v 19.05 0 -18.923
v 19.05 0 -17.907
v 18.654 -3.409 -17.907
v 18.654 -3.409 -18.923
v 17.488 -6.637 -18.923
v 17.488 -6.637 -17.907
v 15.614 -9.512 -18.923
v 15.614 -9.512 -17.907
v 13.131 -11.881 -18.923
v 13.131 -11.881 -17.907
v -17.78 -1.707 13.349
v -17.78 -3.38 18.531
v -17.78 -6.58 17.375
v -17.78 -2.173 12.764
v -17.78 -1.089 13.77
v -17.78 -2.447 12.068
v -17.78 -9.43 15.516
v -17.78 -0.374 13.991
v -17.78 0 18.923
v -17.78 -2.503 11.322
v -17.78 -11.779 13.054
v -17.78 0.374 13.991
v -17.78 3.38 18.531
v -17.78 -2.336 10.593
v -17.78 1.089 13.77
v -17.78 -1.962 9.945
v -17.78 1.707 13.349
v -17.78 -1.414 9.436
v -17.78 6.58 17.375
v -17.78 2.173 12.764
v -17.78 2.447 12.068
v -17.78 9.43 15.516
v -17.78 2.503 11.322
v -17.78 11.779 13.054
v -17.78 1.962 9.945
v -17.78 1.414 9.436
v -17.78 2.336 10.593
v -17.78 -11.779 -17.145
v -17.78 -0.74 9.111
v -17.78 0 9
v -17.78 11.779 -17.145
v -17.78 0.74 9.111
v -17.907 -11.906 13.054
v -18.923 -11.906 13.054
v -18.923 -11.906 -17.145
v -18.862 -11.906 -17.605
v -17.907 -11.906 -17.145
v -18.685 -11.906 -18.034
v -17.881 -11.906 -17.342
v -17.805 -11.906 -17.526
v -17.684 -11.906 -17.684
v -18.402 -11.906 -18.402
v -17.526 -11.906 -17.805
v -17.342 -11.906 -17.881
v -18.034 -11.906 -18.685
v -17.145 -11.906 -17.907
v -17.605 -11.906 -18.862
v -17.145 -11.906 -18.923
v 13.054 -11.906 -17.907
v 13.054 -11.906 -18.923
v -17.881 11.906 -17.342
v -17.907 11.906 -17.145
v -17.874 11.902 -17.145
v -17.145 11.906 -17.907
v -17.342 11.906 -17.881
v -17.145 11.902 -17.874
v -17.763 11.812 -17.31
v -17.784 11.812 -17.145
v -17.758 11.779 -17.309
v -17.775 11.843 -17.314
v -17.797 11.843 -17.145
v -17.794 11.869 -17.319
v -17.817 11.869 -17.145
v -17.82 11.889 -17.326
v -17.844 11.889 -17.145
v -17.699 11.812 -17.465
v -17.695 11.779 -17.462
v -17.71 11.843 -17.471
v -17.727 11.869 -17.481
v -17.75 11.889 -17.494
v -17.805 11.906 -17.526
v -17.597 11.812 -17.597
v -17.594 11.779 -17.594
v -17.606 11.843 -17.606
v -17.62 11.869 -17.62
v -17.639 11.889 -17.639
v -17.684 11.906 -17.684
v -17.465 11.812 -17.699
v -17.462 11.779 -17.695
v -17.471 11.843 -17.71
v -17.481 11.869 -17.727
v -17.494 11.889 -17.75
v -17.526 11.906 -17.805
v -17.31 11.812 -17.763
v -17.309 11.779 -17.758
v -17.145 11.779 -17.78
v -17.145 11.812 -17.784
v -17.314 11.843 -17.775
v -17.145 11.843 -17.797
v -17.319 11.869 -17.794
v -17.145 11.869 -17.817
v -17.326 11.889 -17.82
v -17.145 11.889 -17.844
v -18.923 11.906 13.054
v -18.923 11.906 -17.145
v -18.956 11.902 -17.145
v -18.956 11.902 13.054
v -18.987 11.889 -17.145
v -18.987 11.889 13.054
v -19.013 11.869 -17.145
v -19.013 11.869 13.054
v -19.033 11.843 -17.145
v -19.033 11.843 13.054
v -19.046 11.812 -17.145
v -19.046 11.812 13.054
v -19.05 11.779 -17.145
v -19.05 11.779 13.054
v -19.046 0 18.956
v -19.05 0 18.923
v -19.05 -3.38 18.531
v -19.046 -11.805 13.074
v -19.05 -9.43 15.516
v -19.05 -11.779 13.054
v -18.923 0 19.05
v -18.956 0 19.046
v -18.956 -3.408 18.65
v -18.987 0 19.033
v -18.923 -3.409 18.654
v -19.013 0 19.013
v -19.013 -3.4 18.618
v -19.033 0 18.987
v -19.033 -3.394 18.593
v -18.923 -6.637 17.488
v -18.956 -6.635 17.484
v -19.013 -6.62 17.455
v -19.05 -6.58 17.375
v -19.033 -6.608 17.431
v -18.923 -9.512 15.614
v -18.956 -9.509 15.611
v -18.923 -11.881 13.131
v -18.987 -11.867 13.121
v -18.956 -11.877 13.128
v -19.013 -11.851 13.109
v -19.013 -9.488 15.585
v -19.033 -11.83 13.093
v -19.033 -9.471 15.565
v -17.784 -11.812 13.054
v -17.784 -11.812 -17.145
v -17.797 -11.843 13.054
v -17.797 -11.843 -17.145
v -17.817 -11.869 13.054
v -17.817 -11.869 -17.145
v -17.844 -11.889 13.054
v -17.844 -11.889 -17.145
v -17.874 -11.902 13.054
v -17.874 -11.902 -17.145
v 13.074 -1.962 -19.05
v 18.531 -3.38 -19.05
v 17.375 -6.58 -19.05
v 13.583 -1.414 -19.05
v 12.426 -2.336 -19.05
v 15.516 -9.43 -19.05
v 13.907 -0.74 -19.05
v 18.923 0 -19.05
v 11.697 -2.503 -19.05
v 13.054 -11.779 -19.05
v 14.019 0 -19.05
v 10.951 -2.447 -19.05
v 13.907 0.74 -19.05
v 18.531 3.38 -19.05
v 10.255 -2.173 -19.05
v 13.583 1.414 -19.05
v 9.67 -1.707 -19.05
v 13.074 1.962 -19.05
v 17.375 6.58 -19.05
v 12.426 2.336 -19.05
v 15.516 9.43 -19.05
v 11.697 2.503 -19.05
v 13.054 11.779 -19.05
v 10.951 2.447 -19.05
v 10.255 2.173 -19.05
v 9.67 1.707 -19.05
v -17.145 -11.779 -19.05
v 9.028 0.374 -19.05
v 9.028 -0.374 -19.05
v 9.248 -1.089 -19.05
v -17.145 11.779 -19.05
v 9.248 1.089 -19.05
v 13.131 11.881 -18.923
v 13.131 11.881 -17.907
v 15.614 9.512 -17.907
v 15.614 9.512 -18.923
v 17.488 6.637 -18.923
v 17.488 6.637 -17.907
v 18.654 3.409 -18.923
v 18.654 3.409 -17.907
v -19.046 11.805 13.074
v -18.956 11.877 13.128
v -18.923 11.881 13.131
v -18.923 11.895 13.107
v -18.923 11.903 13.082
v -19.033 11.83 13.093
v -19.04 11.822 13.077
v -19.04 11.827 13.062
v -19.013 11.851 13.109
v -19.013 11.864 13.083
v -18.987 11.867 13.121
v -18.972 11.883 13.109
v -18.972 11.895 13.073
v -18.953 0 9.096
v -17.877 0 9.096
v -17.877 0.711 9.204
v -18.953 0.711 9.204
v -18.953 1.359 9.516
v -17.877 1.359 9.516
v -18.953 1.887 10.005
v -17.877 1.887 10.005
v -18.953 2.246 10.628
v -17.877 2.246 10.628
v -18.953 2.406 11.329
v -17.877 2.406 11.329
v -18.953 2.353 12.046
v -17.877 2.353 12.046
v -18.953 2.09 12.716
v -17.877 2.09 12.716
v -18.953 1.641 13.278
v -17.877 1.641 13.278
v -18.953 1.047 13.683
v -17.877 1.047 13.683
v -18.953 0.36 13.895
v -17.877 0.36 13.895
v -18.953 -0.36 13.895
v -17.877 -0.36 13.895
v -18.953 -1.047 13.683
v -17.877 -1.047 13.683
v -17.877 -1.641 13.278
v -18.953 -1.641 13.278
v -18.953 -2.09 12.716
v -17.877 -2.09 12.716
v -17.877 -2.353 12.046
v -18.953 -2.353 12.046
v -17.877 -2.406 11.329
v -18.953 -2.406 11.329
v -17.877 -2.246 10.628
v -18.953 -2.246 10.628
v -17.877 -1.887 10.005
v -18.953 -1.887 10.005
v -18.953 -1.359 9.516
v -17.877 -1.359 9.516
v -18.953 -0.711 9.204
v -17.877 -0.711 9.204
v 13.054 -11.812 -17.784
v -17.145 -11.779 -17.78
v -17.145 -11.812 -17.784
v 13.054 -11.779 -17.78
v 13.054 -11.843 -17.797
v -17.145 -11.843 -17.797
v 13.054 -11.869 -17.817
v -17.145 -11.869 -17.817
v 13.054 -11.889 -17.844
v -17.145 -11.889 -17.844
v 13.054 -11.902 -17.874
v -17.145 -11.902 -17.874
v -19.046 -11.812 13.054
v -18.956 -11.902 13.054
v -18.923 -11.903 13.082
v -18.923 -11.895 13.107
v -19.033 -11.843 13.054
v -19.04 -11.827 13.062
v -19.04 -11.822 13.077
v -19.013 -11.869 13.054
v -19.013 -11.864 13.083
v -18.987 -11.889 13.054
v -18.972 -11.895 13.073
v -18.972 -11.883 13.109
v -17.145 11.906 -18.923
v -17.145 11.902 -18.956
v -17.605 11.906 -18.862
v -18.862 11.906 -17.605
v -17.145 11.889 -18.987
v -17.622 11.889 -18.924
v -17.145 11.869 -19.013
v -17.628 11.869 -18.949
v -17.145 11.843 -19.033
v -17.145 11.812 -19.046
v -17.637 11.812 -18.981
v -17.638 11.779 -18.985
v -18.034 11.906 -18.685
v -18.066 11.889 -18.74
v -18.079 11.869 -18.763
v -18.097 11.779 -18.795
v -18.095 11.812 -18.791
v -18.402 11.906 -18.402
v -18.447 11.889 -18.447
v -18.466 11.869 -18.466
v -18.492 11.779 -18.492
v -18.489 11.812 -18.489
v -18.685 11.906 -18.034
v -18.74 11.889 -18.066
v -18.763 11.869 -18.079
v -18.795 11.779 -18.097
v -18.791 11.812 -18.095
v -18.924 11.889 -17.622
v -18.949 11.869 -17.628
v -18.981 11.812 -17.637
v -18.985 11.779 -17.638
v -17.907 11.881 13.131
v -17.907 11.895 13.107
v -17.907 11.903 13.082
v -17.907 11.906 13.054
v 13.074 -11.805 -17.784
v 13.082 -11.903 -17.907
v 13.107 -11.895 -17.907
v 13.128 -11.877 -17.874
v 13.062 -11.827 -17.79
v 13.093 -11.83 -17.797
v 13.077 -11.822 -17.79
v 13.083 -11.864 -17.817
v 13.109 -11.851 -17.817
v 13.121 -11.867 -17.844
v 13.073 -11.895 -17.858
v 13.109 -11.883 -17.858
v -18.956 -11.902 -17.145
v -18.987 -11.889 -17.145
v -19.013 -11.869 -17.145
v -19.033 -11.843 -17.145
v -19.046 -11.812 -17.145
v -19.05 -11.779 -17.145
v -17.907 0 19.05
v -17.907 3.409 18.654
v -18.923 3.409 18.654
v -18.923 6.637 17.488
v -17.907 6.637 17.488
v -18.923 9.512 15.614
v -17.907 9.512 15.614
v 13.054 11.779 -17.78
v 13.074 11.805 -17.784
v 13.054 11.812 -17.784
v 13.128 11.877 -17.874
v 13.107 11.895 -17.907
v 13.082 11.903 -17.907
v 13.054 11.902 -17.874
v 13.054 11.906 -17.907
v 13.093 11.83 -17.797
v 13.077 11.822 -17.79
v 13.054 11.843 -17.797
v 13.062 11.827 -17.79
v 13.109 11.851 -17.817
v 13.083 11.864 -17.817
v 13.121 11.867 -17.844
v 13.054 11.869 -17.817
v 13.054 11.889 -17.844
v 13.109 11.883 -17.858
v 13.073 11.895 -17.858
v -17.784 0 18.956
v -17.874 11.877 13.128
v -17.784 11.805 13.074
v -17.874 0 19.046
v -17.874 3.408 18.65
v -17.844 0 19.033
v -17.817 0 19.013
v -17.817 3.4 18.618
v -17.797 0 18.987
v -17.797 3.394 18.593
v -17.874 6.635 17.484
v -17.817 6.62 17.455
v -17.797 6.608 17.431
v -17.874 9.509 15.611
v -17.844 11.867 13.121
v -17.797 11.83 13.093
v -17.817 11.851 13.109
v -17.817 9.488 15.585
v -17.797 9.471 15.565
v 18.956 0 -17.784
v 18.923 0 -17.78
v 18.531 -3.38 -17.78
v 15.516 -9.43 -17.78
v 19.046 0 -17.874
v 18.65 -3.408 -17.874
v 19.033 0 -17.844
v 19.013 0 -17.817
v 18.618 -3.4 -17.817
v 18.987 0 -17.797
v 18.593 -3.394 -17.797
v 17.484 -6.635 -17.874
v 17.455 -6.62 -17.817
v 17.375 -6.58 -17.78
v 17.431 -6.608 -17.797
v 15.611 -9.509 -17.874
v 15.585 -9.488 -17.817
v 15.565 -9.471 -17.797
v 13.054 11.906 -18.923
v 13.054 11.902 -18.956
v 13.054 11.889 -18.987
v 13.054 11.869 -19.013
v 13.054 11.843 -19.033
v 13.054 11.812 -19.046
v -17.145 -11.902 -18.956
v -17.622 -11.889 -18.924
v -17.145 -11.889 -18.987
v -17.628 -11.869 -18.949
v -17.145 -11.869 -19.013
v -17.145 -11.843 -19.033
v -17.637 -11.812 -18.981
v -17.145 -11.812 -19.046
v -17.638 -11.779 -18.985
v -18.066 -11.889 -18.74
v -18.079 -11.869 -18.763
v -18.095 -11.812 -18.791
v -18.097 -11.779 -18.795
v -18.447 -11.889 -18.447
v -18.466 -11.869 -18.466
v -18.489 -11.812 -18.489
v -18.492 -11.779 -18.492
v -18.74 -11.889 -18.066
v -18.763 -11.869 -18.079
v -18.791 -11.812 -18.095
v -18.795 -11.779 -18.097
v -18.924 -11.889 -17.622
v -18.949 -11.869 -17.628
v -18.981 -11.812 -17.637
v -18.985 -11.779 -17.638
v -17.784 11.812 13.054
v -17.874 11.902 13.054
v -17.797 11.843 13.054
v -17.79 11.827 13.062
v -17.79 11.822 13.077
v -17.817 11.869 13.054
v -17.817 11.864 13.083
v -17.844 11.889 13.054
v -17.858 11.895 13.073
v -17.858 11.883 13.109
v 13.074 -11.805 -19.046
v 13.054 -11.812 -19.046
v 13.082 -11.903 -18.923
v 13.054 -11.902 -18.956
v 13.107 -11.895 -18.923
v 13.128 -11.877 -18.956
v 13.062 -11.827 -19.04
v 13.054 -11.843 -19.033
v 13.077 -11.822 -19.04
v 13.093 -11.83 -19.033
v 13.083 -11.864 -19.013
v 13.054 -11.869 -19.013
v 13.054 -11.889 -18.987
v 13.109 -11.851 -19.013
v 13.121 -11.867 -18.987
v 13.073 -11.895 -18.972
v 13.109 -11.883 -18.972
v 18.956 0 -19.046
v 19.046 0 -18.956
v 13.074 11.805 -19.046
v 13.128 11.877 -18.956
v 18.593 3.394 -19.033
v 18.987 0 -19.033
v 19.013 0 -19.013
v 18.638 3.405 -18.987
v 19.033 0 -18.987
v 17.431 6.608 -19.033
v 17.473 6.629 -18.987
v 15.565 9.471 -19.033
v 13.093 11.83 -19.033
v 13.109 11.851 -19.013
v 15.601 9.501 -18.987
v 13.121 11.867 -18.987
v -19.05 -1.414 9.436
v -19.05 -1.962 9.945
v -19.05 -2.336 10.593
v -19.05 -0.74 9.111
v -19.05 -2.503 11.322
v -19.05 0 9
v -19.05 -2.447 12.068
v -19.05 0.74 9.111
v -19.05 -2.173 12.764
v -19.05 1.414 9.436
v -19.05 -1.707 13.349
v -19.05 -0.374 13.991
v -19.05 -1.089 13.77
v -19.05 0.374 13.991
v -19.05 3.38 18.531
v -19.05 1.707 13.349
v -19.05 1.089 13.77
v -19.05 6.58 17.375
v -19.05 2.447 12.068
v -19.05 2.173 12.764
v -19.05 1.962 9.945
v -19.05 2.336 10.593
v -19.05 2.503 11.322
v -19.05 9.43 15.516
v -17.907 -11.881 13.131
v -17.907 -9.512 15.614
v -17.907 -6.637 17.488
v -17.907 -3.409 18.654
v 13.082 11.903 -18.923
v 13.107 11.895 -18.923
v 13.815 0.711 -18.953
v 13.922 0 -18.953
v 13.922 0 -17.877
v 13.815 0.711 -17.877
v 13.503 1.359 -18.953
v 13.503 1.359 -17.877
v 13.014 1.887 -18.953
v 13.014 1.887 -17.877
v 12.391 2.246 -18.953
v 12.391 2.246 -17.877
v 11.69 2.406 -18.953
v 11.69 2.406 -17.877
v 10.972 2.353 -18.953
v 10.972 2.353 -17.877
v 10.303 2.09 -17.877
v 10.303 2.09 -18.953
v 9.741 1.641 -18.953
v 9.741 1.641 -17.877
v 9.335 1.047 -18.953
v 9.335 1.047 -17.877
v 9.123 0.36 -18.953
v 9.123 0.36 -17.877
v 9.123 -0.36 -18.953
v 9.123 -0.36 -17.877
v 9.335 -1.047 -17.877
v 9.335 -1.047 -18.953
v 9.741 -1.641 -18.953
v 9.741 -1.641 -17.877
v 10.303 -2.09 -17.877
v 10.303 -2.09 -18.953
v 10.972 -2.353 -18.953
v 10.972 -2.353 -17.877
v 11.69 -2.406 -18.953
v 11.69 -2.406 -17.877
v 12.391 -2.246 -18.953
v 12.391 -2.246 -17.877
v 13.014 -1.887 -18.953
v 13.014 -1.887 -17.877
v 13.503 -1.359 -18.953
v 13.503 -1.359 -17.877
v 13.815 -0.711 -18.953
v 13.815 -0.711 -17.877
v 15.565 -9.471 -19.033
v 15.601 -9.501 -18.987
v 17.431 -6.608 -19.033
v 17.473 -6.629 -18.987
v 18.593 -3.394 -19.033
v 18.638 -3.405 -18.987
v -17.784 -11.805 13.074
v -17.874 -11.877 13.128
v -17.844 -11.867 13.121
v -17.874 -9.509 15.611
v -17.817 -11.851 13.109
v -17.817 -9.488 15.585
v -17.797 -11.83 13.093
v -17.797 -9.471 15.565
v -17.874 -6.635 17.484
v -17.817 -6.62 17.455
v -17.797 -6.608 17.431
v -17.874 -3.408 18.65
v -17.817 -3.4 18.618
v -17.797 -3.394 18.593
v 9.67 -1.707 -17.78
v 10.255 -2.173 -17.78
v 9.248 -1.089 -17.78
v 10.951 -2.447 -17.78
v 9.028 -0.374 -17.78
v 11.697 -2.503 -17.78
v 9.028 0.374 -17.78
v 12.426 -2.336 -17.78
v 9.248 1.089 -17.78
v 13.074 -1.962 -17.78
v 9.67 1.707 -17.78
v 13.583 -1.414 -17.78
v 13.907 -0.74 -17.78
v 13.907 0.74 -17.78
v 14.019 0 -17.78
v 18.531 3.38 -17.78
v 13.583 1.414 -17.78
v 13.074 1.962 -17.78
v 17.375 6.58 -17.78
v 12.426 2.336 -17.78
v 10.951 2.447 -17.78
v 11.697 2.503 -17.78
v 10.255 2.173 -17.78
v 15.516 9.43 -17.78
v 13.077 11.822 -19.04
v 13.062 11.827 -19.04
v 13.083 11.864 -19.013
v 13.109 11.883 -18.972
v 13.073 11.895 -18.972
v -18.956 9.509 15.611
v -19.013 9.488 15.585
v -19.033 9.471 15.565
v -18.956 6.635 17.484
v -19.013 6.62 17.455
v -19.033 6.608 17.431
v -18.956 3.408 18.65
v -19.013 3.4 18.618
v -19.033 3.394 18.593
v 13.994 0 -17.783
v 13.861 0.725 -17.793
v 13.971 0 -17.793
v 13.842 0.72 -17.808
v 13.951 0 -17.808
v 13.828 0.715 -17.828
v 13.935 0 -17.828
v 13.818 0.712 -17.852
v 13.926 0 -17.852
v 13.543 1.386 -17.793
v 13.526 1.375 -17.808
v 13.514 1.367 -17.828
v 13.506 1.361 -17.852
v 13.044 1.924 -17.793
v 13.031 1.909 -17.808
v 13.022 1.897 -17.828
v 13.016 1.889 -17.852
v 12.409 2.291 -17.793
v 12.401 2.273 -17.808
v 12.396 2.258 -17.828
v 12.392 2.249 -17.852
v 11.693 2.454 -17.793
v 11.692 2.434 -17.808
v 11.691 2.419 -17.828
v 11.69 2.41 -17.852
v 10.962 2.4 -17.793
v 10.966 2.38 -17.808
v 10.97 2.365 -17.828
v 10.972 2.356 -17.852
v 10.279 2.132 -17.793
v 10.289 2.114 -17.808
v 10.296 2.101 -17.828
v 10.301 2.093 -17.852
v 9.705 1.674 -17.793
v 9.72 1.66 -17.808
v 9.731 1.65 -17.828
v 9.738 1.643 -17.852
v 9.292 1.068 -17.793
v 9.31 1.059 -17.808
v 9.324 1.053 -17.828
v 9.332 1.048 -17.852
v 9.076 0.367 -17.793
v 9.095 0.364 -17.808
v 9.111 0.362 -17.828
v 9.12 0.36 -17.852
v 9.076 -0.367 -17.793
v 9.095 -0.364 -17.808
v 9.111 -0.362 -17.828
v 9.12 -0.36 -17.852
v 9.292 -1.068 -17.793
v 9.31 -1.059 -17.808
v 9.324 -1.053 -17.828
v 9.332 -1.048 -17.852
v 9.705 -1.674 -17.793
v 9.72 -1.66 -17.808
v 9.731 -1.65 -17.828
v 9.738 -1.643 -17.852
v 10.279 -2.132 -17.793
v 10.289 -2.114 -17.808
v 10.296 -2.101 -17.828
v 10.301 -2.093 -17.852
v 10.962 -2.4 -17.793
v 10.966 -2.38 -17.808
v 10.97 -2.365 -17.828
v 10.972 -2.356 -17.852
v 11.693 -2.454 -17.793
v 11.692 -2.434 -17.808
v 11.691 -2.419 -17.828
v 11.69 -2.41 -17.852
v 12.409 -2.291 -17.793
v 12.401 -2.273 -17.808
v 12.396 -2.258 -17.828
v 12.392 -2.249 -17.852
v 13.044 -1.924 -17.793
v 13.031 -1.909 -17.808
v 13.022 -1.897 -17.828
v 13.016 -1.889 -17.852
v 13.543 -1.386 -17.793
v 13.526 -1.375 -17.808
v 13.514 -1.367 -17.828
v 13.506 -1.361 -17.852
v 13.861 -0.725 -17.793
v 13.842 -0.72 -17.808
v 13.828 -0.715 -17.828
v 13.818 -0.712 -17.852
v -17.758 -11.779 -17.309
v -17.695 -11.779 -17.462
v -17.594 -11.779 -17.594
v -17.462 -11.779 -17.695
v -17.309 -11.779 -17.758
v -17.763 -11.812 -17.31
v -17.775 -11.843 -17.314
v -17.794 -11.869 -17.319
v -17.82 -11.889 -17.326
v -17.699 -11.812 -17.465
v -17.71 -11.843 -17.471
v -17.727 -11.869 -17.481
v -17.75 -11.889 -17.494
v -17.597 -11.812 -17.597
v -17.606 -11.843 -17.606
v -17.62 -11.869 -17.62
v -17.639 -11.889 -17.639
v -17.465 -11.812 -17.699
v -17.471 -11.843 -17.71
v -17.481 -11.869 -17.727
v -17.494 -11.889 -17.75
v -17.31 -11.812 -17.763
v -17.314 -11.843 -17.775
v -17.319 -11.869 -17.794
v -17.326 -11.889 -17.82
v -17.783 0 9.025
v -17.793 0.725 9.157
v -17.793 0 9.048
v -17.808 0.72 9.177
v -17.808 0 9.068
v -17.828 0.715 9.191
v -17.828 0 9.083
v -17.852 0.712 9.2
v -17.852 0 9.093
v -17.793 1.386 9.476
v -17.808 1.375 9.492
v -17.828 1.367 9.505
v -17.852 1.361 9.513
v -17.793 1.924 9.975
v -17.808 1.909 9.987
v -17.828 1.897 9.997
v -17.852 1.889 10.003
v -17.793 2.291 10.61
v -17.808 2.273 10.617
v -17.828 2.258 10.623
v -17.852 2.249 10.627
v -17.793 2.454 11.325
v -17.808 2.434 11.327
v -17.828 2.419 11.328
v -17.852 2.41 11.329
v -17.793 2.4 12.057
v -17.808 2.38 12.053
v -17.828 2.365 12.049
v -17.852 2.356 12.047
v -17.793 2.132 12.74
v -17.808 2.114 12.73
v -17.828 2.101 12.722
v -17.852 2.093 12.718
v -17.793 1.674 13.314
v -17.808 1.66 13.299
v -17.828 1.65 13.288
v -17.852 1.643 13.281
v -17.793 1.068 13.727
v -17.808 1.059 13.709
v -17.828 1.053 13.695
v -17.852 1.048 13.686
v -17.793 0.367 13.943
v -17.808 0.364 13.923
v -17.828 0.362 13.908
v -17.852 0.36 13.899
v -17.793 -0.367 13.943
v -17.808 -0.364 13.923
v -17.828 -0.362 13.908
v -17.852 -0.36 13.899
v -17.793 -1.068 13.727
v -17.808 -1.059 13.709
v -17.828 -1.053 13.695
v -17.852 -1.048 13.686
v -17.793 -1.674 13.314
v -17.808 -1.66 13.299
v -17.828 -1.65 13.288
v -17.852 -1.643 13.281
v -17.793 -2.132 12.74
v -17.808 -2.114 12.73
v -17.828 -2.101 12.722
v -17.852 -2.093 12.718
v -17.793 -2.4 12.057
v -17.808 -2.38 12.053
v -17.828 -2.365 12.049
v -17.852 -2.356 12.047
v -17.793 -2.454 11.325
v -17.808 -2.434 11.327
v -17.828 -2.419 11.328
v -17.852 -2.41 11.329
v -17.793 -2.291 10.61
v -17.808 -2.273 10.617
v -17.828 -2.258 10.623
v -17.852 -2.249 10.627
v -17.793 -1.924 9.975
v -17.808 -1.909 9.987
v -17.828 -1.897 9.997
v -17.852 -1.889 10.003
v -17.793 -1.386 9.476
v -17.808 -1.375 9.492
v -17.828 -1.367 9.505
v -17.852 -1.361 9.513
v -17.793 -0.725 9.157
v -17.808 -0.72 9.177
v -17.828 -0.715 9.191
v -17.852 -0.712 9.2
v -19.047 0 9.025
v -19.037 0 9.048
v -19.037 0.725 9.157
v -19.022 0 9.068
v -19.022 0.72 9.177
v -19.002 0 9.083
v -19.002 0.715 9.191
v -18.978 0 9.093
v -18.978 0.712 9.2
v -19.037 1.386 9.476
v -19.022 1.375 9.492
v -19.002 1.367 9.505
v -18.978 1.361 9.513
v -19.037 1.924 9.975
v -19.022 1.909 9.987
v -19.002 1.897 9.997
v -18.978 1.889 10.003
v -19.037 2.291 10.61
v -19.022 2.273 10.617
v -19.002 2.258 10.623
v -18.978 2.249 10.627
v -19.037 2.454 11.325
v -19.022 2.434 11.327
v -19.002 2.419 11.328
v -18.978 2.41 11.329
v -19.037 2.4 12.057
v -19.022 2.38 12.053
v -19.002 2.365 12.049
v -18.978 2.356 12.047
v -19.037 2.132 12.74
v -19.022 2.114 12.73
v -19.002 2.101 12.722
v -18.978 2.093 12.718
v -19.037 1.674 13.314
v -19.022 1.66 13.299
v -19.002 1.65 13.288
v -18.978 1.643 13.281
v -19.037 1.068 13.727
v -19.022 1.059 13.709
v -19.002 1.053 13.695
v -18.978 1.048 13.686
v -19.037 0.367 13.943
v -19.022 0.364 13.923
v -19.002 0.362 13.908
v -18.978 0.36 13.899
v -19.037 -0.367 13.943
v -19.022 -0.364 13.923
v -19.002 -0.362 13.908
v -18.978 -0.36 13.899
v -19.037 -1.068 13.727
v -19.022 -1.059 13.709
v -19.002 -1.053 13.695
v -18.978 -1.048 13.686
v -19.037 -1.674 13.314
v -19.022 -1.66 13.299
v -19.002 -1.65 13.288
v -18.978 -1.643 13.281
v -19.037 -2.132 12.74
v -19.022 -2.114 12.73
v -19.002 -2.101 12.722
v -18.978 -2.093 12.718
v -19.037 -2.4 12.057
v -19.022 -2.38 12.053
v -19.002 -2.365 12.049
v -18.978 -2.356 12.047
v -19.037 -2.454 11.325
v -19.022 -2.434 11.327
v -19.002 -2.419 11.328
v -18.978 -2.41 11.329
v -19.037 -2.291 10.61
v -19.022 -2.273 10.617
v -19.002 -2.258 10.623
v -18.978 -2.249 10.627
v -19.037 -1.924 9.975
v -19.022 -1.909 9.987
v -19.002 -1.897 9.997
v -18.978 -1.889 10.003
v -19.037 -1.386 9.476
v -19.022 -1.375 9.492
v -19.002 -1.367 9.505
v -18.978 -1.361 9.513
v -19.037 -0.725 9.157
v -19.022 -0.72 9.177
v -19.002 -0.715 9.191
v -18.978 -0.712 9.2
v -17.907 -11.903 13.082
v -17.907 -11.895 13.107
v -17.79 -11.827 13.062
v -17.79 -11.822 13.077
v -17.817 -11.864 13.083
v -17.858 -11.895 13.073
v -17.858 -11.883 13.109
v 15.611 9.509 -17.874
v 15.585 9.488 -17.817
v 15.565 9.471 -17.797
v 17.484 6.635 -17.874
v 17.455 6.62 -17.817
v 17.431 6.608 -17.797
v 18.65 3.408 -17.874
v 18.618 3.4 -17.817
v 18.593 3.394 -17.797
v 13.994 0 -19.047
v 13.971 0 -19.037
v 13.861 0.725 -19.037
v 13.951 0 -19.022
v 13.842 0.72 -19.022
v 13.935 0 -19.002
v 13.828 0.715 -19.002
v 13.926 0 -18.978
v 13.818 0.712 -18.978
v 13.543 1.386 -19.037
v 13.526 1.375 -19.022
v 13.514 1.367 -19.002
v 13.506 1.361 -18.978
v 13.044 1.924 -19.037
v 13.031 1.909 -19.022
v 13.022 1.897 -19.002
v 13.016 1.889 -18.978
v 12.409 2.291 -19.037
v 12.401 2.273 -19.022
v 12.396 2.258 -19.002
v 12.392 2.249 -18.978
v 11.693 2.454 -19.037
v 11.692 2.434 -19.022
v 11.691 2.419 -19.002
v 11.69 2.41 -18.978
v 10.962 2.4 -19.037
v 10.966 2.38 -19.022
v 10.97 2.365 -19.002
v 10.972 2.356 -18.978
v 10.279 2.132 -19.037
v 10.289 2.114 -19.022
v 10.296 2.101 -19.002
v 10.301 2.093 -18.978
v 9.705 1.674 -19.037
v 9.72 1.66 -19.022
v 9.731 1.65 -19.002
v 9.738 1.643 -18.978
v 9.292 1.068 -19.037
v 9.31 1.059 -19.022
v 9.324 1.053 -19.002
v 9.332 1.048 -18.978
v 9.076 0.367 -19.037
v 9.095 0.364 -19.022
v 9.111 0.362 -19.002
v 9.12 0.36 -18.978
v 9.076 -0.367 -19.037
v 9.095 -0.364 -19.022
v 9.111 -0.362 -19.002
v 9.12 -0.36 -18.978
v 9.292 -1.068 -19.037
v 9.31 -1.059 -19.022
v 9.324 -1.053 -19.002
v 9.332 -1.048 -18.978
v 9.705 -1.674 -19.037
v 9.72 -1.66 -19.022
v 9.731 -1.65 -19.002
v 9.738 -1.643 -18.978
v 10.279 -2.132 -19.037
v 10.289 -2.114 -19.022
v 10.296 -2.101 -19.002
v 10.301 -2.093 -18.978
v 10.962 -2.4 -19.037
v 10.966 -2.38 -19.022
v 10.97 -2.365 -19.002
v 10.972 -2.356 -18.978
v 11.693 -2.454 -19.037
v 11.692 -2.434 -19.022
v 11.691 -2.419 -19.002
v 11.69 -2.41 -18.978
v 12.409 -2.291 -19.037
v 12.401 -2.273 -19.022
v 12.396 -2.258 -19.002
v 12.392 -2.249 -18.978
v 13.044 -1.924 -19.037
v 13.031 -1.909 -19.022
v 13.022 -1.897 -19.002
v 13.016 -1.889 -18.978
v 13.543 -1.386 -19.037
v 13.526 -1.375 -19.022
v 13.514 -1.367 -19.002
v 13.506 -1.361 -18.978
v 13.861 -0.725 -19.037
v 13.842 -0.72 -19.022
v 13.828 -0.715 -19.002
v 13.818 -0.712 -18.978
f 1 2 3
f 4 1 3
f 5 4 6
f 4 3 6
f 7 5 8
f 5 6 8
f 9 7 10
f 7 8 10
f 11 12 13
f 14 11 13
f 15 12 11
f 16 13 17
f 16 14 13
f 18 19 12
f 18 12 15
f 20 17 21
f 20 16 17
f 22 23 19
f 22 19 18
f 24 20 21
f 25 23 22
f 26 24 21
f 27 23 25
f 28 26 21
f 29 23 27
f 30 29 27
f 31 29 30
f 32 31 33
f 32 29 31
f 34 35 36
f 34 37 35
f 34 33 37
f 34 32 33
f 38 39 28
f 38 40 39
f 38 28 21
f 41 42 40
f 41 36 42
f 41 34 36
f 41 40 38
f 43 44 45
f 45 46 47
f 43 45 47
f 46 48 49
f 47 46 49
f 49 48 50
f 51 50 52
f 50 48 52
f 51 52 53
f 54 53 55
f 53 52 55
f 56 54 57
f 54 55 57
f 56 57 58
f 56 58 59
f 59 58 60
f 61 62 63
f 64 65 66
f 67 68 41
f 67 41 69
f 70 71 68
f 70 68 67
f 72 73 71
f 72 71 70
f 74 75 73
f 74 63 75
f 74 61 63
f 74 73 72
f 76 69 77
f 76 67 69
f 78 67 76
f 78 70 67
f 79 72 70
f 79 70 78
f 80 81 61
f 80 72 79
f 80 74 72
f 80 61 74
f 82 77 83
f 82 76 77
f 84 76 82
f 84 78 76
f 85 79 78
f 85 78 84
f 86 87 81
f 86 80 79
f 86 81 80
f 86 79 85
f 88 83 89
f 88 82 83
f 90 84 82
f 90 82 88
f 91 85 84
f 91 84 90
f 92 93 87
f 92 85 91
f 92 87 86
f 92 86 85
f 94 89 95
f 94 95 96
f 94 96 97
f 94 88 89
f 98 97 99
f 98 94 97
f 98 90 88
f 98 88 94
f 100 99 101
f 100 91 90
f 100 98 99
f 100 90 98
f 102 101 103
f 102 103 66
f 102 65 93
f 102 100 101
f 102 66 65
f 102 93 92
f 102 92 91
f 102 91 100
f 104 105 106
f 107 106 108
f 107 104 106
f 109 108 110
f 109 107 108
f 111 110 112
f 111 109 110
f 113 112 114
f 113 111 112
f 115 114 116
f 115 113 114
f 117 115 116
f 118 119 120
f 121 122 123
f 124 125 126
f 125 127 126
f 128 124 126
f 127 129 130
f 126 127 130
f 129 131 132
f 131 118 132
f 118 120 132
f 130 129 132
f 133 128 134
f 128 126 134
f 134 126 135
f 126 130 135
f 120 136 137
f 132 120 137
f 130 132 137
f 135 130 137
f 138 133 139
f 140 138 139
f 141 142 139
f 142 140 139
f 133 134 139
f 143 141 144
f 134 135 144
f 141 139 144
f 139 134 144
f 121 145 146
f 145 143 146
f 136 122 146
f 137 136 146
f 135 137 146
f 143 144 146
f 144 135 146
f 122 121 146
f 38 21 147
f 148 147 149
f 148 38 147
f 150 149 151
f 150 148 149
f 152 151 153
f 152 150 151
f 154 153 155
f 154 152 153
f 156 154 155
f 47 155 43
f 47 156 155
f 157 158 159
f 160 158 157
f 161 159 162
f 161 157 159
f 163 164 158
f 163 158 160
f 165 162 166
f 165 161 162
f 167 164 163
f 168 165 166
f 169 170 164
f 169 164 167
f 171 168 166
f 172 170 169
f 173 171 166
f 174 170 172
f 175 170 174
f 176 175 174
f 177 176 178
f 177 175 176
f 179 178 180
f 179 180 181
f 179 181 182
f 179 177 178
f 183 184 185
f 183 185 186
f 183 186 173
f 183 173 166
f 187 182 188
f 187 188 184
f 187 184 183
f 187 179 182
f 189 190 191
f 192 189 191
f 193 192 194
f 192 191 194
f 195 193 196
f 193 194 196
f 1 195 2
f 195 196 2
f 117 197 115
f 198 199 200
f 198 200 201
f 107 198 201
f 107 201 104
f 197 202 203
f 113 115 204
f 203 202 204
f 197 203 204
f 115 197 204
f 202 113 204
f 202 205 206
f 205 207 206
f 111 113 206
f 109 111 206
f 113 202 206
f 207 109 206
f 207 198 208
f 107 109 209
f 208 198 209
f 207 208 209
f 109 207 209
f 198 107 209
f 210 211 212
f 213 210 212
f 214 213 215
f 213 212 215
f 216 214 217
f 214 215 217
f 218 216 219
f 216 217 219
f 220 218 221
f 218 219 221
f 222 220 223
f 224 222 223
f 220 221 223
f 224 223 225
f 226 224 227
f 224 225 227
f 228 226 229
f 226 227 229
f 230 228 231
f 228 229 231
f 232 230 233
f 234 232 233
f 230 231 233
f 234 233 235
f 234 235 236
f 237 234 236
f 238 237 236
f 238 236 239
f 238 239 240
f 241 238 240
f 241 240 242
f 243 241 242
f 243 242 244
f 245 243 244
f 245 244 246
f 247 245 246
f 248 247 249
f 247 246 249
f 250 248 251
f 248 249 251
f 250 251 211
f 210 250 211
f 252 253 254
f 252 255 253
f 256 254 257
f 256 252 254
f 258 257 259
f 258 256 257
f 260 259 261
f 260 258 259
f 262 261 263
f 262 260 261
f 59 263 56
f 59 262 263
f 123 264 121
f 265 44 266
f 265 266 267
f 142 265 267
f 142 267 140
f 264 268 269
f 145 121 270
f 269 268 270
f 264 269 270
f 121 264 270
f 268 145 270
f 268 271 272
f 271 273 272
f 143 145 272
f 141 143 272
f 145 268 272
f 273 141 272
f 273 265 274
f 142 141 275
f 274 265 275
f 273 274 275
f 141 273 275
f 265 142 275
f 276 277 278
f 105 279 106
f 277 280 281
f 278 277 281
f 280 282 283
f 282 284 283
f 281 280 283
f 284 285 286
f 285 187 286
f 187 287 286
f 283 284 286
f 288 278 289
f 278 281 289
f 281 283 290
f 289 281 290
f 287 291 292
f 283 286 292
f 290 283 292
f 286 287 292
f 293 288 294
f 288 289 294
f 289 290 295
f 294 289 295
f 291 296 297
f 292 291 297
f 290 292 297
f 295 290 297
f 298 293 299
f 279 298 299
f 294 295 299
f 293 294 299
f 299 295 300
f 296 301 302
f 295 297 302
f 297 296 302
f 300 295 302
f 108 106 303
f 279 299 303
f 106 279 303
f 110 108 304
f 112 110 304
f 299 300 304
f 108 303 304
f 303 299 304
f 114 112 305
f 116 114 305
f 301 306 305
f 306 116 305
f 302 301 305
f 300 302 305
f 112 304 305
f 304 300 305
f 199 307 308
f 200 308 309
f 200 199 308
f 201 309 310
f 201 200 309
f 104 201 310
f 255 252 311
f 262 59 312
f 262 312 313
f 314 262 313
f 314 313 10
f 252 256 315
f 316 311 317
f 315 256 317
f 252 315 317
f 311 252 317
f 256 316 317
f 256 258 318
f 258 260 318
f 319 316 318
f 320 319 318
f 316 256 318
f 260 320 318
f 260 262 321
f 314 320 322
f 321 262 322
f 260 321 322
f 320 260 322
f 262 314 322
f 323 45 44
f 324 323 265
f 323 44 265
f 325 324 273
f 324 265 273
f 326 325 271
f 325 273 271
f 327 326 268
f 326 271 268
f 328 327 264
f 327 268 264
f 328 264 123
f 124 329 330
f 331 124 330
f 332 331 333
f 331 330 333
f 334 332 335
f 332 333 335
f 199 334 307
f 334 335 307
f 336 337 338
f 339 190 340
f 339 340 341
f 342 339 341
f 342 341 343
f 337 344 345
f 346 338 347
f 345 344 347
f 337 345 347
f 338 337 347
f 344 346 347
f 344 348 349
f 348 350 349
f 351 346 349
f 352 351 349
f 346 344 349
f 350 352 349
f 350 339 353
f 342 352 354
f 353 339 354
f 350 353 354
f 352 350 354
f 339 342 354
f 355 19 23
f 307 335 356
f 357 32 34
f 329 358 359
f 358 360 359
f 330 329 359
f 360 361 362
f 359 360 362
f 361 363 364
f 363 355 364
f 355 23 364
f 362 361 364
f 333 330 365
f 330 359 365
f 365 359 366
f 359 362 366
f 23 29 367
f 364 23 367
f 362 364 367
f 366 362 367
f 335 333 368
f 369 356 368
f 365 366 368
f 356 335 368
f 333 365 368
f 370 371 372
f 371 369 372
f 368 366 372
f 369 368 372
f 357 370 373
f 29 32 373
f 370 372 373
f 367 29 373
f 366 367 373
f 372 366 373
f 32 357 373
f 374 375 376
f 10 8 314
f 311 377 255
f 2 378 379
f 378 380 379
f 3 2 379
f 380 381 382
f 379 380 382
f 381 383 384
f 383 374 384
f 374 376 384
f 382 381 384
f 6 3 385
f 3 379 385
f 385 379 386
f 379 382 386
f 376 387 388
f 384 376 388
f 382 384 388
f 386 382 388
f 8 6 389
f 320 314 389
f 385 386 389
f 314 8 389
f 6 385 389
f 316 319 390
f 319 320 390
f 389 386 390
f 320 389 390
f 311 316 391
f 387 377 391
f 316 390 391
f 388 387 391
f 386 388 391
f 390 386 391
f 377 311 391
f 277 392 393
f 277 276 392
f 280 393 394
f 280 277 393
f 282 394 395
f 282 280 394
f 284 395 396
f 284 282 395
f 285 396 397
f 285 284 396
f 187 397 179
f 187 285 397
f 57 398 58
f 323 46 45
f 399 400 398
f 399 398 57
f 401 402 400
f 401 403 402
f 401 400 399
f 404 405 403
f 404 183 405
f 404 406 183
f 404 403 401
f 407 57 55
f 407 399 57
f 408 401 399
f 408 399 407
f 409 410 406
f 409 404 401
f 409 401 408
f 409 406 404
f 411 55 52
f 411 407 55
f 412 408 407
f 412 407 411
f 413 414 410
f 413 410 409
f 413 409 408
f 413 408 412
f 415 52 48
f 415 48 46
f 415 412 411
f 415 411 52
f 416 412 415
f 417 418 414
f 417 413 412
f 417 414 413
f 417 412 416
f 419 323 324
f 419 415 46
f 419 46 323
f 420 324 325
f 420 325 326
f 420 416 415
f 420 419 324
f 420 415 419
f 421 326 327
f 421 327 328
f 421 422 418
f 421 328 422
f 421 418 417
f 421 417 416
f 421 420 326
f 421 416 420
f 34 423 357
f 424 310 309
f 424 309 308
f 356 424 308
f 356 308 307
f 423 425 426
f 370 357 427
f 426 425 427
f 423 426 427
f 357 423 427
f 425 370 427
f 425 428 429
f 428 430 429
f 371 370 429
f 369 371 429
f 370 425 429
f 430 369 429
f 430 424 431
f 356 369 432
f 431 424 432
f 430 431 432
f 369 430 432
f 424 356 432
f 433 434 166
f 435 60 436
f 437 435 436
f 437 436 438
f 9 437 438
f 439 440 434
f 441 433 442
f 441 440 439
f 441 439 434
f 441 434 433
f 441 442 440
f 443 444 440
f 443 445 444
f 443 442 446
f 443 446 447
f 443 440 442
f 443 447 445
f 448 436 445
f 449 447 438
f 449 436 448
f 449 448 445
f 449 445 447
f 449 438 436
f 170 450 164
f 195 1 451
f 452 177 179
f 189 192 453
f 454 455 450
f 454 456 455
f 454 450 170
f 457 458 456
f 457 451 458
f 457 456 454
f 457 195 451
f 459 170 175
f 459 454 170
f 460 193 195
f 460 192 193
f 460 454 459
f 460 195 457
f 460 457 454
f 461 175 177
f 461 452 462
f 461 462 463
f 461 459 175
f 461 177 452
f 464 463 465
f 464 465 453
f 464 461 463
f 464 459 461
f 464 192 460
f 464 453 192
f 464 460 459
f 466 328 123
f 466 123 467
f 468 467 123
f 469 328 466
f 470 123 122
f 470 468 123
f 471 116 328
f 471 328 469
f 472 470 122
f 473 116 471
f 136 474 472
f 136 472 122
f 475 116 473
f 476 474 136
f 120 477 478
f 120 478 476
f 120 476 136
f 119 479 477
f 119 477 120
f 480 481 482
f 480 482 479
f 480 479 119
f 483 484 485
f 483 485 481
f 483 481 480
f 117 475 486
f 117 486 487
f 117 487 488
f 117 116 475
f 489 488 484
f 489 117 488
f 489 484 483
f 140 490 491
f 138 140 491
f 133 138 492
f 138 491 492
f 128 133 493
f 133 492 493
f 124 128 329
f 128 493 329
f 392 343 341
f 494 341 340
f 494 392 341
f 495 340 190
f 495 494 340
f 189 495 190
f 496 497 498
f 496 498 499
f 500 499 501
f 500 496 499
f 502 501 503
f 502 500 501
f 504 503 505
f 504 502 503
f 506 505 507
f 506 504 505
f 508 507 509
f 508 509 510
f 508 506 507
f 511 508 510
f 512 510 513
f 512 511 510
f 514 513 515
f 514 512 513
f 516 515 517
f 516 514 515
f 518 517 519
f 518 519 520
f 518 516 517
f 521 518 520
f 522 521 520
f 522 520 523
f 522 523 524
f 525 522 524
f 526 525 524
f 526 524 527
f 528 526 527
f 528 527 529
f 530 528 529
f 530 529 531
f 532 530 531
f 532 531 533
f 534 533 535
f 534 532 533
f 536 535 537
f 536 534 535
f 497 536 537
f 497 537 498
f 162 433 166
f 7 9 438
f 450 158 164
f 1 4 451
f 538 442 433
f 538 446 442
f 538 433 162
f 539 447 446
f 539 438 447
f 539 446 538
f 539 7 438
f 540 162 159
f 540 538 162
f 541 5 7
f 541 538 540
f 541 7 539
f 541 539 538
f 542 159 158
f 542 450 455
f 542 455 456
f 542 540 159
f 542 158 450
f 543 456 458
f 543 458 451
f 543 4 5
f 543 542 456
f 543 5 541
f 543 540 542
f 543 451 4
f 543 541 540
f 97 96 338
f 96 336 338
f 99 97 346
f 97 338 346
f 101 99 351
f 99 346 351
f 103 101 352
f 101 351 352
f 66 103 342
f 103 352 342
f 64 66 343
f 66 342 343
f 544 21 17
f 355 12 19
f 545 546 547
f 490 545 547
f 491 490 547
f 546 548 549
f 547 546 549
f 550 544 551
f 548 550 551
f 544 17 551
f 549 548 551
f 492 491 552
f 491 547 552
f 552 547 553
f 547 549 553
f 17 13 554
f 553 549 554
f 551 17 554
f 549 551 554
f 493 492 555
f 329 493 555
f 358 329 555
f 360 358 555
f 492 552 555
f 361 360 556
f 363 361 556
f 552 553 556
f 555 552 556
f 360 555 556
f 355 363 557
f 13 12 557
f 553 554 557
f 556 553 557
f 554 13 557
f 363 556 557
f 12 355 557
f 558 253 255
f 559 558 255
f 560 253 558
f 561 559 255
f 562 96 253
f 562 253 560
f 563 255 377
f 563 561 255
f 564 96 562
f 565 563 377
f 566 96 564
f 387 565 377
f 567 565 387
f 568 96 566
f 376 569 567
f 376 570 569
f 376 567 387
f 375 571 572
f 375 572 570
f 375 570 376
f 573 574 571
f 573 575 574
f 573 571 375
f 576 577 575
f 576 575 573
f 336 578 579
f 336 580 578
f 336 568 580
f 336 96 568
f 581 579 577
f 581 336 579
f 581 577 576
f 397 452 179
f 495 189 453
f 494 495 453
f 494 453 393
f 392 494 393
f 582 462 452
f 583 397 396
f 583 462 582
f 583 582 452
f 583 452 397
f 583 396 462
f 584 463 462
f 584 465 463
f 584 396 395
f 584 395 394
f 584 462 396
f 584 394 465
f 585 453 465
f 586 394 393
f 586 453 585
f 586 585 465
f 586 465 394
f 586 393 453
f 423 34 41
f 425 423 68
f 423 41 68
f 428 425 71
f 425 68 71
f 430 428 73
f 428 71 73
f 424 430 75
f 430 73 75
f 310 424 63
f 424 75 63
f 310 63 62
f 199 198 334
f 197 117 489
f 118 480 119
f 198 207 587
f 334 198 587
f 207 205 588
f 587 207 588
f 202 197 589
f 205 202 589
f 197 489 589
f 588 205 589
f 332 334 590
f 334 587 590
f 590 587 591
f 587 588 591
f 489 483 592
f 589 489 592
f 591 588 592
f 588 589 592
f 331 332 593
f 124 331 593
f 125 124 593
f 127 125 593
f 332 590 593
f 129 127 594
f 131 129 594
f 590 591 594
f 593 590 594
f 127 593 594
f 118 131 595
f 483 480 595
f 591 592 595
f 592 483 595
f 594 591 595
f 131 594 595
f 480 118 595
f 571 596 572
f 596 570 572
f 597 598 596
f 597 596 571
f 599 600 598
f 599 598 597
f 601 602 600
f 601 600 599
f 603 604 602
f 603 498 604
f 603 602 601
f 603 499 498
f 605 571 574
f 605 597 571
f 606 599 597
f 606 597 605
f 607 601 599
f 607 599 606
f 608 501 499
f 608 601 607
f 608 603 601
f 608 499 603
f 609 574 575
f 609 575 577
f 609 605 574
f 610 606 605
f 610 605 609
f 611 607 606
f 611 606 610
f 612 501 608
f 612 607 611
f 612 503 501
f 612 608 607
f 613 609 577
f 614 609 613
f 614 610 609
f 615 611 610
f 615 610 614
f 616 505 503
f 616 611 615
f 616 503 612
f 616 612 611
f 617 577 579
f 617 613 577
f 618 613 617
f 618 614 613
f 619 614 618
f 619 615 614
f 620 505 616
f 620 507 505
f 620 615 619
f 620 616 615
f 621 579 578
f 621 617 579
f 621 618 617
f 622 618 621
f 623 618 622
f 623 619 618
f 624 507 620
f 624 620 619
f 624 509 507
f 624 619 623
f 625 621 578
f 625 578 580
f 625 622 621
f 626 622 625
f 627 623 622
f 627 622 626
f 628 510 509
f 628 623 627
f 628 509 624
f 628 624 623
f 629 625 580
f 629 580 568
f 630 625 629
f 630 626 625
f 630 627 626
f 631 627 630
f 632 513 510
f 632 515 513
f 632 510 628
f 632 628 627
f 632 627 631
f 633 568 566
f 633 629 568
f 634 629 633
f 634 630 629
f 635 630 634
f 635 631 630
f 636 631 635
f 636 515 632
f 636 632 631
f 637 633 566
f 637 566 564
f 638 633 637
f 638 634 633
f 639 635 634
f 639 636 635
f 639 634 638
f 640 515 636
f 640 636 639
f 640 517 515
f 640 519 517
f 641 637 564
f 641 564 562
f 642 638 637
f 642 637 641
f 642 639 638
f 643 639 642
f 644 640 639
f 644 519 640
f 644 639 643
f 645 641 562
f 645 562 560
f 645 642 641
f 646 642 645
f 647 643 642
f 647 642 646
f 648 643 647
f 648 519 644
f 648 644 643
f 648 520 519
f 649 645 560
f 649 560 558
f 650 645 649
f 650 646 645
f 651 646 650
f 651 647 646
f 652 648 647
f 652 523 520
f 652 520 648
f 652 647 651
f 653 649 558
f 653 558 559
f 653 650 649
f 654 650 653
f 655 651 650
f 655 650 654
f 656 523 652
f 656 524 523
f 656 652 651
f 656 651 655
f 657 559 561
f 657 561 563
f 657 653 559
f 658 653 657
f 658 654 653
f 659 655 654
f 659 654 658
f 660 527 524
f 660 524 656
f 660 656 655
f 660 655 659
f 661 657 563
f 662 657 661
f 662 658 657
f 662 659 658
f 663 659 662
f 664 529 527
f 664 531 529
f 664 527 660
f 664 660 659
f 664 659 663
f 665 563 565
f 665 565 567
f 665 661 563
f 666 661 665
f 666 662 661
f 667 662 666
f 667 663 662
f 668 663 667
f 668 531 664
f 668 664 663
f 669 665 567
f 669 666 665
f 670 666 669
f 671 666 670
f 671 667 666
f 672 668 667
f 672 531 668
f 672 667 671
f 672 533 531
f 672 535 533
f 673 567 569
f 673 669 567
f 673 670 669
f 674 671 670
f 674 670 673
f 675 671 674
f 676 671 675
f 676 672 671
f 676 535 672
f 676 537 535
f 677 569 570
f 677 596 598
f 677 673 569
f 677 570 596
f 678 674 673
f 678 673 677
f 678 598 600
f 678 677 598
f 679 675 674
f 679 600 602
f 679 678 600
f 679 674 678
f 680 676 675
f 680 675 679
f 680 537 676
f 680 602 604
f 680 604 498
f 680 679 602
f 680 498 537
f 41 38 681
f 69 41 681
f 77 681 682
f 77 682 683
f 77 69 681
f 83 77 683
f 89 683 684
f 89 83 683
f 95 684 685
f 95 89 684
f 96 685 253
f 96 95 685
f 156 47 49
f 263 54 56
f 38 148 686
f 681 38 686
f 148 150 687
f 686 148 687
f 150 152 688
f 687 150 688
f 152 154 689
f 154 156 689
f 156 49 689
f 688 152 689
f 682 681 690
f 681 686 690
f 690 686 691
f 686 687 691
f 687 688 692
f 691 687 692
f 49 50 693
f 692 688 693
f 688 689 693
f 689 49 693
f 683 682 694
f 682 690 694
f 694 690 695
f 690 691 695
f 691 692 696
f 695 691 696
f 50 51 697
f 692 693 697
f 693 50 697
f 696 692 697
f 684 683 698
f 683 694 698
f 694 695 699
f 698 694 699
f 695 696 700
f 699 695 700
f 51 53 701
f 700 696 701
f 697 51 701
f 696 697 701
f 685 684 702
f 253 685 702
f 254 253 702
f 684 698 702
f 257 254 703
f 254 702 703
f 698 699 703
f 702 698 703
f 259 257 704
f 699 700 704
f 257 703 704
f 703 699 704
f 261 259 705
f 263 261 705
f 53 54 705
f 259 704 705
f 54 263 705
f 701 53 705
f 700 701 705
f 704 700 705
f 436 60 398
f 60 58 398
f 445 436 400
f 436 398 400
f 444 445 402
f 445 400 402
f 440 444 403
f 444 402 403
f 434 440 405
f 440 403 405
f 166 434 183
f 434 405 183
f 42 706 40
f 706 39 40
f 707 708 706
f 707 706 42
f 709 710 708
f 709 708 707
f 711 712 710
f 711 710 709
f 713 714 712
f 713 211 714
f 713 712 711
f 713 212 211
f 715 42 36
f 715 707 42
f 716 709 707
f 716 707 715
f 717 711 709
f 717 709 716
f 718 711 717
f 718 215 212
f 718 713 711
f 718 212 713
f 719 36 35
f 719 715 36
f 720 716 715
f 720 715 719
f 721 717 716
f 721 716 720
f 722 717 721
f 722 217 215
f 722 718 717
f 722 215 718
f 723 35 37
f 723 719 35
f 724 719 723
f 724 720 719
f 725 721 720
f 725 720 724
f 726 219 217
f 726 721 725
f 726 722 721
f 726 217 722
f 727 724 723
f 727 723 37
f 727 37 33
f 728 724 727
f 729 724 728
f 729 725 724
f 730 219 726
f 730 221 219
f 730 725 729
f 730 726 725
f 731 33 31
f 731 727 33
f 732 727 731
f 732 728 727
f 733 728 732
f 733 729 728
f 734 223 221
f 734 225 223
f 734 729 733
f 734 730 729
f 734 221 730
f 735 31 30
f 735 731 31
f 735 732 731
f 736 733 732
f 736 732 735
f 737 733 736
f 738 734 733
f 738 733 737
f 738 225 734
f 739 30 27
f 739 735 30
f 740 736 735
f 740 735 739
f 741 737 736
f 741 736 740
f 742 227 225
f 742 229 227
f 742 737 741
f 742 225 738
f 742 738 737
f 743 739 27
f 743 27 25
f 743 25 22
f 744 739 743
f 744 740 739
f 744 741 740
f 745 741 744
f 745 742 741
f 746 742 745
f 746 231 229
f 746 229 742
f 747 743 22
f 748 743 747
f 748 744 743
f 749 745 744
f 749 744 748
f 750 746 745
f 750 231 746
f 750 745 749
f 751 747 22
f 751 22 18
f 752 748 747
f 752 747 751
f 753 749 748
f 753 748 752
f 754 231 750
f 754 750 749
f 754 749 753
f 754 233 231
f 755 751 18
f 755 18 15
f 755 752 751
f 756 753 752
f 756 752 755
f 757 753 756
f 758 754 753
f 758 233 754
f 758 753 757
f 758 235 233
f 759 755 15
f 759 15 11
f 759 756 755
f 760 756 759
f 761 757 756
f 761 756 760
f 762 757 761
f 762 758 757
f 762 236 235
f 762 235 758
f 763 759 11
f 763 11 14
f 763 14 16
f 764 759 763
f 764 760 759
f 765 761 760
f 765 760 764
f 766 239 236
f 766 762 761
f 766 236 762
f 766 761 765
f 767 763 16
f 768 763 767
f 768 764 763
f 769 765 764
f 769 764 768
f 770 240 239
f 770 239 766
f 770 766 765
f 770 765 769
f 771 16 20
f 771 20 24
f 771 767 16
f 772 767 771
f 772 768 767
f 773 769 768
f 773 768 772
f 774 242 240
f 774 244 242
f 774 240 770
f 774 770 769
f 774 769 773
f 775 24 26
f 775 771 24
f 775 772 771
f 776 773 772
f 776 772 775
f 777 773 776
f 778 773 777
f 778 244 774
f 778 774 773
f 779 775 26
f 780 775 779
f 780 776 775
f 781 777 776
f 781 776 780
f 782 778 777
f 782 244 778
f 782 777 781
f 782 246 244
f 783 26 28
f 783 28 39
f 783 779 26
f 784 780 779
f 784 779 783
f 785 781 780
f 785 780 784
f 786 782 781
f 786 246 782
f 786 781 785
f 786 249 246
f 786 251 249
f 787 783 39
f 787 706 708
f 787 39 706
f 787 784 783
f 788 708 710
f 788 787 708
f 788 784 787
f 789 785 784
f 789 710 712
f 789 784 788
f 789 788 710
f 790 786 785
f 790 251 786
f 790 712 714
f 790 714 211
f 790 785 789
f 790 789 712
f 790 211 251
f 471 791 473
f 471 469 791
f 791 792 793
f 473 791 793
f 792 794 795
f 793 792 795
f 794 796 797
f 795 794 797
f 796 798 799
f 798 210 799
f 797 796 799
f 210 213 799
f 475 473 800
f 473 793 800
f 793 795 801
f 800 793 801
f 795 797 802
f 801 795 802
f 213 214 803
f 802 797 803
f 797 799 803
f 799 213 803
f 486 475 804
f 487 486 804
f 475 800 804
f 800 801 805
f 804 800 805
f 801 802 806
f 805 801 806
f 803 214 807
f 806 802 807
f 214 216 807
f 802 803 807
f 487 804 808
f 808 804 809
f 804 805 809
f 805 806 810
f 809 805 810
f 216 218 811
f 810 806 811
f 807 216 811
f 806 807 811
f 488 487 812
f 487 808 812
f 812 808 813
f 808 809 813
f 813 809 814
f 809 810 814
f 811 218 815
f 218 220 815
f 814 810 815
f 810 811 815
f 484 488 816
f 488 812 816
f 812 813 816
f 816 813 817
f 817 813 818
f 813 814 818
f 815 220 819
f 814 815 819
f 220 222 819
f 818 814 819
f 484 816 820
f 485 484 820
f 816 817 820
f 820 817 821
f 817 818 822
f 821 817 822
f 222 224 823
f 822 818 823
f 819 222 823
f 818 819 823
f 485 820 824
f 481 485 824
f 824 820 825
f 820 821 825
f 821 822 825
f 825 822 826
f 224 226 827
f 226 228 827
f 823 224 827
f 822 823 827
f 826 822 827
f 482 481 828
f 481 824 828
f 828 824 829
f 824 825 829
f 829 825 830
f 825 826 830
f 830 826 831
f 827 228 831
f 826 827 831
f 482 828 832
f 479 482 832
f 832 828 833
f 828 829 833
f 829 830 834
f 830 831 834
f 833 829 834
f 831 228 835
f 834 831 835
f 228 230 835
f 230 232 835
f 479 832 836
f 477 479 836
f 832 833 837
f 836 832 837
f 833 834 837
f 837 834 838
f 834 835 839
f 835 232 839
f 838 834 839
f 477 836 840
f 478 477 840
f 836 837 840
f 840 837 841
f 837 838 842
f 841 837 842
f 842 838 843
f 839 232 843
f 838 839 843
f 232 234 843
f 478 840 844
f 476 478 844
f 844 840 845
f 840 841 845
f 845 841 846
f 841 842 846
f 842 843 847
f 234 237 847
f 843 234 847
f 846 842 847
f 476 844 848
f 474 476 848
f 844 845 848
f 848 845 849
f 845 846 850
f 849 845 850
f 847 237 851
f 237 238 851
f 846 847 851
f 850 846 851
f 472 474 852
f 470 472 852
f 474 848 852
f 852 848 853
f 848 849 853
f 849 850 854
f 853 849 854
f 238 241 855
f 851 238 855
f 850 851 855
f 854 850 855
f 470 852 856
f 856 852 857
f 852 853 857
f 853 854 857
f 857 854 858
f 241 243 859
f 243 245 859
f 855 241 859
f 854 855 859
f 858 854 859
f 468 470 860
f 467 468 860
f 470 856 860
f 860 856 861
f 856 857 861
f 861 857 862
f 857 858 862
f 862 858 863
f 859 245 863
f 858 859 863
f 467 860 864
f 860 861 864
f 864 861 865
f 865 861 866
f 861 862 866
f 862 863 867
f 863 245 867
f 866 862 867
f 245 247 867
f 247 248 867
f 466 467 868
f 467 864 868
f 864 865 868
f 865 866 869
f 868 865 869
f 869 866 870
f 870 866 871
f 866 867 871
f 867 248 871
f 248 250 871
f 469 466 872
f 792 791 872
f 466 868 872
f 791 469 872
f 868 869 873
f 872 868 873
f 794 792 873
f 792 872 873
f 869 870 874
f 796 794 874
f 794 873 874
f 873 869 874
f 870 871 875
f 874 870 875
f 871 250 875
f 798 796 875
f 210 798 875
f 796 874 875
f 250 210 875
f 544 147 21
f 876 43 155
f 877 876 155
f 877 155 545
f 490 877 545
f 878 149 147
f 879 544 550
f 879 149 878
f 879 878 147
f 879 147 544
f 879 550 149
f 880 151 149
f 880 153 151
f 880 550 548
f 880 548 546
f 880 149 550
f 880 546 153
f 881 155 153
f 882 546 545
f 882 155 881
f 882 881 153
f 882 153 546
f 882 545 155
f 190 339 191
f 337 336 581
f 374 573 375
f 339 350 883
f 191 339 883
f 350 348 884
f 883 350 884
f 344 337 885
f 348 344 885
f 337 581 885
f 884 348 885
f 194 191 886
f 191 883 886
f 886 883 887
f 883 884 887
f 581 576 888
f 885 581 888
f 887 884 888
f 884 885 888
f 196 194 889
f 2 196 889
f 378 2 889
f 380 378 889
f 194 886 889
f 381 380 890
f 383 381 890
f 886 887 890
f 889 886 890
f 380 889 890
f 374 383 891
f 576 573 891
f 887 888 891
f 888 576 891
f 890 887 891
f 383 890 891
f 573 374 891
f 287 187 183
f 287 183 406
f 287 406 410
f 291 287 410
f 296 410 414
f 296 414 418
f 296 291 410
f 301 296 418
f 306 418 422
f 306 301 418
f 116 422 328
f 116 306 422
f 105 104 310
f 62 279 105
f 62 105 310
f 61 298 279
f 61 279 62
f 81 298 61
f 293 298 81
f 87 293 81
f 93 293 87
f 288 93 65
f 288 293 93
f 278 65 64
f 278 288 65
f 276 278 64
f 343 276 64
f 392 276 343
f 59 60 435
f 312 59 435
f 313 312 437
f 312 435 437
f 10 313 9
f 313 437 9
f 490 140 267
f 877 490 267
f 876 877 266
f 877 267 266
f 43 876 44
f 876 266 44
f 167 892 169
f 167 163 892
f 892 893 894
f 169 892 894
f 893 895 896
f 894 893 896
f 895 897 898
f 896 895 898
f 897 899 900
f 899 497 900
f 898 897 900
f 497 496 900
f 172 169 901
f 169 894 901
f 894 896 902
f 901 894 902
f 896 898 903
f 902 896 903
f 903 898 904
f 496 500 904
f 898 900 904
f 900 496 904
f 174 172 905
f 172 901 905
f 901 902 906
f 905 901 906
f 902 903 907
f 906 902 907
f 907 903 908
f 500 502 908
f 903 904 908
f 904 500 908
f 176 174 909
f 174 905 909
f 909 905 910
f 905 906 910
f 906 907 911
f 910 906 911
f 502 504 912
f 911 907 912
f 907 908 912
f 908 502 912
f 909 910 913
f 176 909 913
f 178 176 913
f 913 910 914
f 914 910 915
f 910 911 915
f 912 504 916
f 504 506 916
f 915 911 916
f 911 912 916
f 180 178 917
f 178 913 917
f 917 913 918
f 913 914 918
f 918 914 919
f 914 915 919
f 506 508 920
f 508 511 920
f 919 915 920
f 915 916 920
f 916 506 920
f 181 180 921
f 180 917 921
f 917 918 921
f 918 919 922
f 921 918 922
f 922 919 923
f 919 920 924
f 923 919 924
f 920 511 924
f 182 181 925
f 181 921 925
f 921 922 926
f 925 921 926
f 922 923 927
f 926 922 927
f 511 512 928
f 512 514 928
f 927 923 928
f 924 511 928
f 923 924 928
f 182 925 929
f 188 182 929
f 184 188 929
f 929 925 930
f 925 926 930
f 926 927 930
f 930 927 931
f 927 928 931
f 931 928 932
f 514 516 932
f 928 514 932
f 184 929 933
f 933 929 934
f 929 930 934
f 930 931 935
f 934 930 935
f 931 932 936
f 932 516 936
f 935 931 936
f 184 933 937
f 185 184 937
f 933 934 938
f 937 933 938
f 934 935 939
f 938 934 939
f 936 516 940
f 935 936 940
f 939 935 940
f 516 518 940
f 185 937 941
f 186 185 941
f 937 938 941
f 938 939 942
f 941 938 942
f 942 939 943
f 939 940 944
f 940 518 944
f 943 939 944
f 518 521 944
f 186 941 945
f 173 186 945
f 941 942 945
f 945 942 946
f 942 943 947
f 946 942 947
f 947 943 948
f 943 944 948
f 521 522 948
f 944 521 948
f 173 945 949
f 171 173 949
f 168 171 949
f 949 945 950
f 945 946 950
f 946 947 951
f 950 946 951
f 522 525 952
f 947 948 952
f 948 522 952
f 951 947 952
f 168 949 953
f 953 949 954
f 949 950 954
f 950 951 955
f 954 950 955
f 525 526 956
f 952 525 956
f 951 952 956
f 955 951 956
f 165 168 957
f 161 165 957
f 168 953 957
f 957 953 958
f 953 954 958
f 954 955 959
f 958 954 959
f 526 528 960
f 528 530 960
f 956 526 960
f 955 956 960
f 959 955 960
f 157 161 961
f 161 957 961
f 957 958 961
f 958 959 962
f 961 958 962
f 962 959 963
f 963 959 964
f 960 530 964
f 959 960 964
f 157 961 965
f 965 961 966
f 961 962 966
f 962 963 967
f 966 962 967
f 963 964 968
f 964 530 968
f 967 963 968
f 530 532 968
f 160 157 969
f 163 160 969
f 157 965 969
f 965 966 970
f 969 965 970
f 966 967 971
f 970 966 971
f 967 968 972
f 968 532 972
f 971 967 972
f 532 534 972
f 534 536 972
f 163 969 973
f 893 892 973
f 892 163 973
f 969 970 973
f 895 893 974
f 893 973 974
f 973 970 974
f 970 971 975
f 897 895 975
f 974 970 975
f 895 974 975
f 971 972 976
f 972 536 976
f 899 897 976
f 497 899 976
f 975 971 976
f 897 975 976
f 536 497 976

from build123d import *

# Parameters (mm, degrees)
BOSS_EXTRUDE1_START = 11.90625
BOSS_EXTRUDE1_DEPTH = 23.8125
SKETCH5_W           = 1.27
SKETCH5_H           = 2.413
SKETCH6_W           = 2.413
SKETCH6_H           = 1.27
CUT_EXTRUDE1_DEPTH  = 2.27
CUT_EXTRUDE2_DEPTH  = 2.27
FILLET1_R           = 0.127
FILLET2_R           = 0.09652


with BuildPart() as part:
    # Sketch4 → Boss-Extrude1 (new body)
    with BuildSketch(Plane(origin=(0, 0, 0), x_dir=(1, 0, 0), z_dir=(0, 1, 0)).offset(BOSS_EXTRUDE1_START)):
        with BuildLine():
            Line((-19.05, -19.05), (-17.78, -19.05))
            Line((-17.78, -19.05), (-17.78, 17.145))
            ThreePointArc((-17.78, 17.145), (-17.594012806, 17.594012806), (-17.145, 17.78))
            Line((-17.145, 17.78), (19.05, 17.78))
            Line((19.05, 17.78), (19.05, 19.05))
            Line((19.05, 19.05), (-17.145, 19.05))
            ThreePointArc((-17.145, 19.05), (-18.492038418, 18.492038418), (-19.05, 17.145))
            Line((-19.05, 17.145), (-19.05, -19.05))
        make_face()
    extrude(amount=-BOSS_EXTRUDE1_DEPTH)

    # Sketch5 → Cut-Revolve1 (revolve, cut)
    with BuildSketch(Plane(origin=(0, 0, 0), x_dir=(1, 0, 0), z_dir=(0, 1, 0))):
        with Locations((-18.415, -10.302875)):
            Rectangle(SKETCH5_W, SKETCH5_H)
    revolve(axis=Axis((-19.05, 0, 11.509375), (1, 0, 0)), mode=Mode.SUBTRACT)

    # Sketch6 → Cut-Revolve2 (revolve, cut)
    with BuildSketch(Plane(origin=(0, 0, 0), x_dir=(1, 0, 0), z_dir=(0, 1, 0))):
        with Locations((12.715875, 18.415)):
            Rectangle(SKETCH6_W, SKETCH6_H)
    revolve(axis=Axis((11.509375, 0, -19.05), (0, 0, 1)), mode=Mode.SUBTRACT)

    # Sketch7 → Cut-Extrude1 (cut, through all)
    with BuildSketch(Plane(origin=(-17.78, 0, 0), x_dir=(0, 0, -1), z_dir=(1, 0, 0))):
        with BuildLine():
            ThreePointArc((-19.05, 0), (-17.478779679, 6.655796089), (-13.096875, 11.90625))
            Line((-13.096875, 11.90625), (-19.05, 11.90625))
            Line((-19.05, 11.90625), (-19.05, 0))
        make_face()
        with BuildLine():
            ThreePointArc((-13.096875, -11.90625), (-17.478779679, -6.655796089), (-19.05, 0))
            Line((-19.05, 0), (-19.05, -11.90625))
            Line((-19.05, -11.90625), (-13.096875, -11.90625))
        make_face()
    extrude(amount=-CUT_EXTRUDE1_DEPTH, mode=Mode.SUBTRACT)

    # Sketch8 → Cut-Extrude2 (cut, through all)
    with BuildSketch(Plane.XY.offset(-17.78)):
        with BuildLine():
            Line((19.05, 11.90625), (13.096875, 11.90625))
            ThreePointArc((13.096875, 11.90625), (17.478779679, 6.655796089), (19.05, 0))
            Line((19.05, 0), (19.05, 11.90625))
        make_face()
        with BuildLine():
            Line((19.05, -11.90625), (19.05, 0))
            ThreePointArc((19.05, 0), (17.478779679, -6.655796089), (13.096875, -11.90625))
            Line((13.096875, -11.90625), (19.05, -11.90625))
        make_face()
    extrude(amount=-CUT_EXTRUDE2_DEPTH, mode=Mode.SUBTRACT)

    # Fillet1
    fillet1_edges = [part.edges().sort_by_distance(p)[0] for p in [
        (-19.05, 11.90625, -2.0240625),
        (-17.594012806, -11.90625, -17.594012806),
        (-2.0240625, -11.90625, -17.78),
        (-18.492038418, -11.90625, -18.492038418),
        (-17.78, 11.90625, -2.0240625),
        (-17.78, 0, 19.05),
        (-18.415, 11.90625, 13.096875),
        (-19.05, 0, 19.05),
        (-19.05, -11.90625, -2.0240625),
        (-17.78, -11.90625, -2.0240625),
        (-18.415, -11.90625, 13.096875),
        (-2.0240625, 11.90625, -19.05),
        (13.096875, 11.90625, -18.415),
        (19.05, 0, -19.05),
        (19.05, 0, -17.78),
        (-2.0240625, -11.90625, -19.05),
        (13.096875, -11.90625, -18.415),
        (-18.492038418, 11.90625, -18.492038418),
        (-2.0240625, 11.90625, -17.78),
        (-17.594012806, 11.90625, -17.594012806),
    ]]
    fillet(fillet1_edges, radius=FILLET1_R)

    # Fillet2
    fillet2_edges = [part.edges().sort_by_distance(p)[0] for p in [
        (-19.05, 0, 13.922375),
        (-17.78, 0, 13.922375),
        (9.096375, 0, -17.78),
        (9.096375, 0, -19.05),
    ]]
    fillet(fillet2_edges, radius=FILLET2_R)


solid = part.part
